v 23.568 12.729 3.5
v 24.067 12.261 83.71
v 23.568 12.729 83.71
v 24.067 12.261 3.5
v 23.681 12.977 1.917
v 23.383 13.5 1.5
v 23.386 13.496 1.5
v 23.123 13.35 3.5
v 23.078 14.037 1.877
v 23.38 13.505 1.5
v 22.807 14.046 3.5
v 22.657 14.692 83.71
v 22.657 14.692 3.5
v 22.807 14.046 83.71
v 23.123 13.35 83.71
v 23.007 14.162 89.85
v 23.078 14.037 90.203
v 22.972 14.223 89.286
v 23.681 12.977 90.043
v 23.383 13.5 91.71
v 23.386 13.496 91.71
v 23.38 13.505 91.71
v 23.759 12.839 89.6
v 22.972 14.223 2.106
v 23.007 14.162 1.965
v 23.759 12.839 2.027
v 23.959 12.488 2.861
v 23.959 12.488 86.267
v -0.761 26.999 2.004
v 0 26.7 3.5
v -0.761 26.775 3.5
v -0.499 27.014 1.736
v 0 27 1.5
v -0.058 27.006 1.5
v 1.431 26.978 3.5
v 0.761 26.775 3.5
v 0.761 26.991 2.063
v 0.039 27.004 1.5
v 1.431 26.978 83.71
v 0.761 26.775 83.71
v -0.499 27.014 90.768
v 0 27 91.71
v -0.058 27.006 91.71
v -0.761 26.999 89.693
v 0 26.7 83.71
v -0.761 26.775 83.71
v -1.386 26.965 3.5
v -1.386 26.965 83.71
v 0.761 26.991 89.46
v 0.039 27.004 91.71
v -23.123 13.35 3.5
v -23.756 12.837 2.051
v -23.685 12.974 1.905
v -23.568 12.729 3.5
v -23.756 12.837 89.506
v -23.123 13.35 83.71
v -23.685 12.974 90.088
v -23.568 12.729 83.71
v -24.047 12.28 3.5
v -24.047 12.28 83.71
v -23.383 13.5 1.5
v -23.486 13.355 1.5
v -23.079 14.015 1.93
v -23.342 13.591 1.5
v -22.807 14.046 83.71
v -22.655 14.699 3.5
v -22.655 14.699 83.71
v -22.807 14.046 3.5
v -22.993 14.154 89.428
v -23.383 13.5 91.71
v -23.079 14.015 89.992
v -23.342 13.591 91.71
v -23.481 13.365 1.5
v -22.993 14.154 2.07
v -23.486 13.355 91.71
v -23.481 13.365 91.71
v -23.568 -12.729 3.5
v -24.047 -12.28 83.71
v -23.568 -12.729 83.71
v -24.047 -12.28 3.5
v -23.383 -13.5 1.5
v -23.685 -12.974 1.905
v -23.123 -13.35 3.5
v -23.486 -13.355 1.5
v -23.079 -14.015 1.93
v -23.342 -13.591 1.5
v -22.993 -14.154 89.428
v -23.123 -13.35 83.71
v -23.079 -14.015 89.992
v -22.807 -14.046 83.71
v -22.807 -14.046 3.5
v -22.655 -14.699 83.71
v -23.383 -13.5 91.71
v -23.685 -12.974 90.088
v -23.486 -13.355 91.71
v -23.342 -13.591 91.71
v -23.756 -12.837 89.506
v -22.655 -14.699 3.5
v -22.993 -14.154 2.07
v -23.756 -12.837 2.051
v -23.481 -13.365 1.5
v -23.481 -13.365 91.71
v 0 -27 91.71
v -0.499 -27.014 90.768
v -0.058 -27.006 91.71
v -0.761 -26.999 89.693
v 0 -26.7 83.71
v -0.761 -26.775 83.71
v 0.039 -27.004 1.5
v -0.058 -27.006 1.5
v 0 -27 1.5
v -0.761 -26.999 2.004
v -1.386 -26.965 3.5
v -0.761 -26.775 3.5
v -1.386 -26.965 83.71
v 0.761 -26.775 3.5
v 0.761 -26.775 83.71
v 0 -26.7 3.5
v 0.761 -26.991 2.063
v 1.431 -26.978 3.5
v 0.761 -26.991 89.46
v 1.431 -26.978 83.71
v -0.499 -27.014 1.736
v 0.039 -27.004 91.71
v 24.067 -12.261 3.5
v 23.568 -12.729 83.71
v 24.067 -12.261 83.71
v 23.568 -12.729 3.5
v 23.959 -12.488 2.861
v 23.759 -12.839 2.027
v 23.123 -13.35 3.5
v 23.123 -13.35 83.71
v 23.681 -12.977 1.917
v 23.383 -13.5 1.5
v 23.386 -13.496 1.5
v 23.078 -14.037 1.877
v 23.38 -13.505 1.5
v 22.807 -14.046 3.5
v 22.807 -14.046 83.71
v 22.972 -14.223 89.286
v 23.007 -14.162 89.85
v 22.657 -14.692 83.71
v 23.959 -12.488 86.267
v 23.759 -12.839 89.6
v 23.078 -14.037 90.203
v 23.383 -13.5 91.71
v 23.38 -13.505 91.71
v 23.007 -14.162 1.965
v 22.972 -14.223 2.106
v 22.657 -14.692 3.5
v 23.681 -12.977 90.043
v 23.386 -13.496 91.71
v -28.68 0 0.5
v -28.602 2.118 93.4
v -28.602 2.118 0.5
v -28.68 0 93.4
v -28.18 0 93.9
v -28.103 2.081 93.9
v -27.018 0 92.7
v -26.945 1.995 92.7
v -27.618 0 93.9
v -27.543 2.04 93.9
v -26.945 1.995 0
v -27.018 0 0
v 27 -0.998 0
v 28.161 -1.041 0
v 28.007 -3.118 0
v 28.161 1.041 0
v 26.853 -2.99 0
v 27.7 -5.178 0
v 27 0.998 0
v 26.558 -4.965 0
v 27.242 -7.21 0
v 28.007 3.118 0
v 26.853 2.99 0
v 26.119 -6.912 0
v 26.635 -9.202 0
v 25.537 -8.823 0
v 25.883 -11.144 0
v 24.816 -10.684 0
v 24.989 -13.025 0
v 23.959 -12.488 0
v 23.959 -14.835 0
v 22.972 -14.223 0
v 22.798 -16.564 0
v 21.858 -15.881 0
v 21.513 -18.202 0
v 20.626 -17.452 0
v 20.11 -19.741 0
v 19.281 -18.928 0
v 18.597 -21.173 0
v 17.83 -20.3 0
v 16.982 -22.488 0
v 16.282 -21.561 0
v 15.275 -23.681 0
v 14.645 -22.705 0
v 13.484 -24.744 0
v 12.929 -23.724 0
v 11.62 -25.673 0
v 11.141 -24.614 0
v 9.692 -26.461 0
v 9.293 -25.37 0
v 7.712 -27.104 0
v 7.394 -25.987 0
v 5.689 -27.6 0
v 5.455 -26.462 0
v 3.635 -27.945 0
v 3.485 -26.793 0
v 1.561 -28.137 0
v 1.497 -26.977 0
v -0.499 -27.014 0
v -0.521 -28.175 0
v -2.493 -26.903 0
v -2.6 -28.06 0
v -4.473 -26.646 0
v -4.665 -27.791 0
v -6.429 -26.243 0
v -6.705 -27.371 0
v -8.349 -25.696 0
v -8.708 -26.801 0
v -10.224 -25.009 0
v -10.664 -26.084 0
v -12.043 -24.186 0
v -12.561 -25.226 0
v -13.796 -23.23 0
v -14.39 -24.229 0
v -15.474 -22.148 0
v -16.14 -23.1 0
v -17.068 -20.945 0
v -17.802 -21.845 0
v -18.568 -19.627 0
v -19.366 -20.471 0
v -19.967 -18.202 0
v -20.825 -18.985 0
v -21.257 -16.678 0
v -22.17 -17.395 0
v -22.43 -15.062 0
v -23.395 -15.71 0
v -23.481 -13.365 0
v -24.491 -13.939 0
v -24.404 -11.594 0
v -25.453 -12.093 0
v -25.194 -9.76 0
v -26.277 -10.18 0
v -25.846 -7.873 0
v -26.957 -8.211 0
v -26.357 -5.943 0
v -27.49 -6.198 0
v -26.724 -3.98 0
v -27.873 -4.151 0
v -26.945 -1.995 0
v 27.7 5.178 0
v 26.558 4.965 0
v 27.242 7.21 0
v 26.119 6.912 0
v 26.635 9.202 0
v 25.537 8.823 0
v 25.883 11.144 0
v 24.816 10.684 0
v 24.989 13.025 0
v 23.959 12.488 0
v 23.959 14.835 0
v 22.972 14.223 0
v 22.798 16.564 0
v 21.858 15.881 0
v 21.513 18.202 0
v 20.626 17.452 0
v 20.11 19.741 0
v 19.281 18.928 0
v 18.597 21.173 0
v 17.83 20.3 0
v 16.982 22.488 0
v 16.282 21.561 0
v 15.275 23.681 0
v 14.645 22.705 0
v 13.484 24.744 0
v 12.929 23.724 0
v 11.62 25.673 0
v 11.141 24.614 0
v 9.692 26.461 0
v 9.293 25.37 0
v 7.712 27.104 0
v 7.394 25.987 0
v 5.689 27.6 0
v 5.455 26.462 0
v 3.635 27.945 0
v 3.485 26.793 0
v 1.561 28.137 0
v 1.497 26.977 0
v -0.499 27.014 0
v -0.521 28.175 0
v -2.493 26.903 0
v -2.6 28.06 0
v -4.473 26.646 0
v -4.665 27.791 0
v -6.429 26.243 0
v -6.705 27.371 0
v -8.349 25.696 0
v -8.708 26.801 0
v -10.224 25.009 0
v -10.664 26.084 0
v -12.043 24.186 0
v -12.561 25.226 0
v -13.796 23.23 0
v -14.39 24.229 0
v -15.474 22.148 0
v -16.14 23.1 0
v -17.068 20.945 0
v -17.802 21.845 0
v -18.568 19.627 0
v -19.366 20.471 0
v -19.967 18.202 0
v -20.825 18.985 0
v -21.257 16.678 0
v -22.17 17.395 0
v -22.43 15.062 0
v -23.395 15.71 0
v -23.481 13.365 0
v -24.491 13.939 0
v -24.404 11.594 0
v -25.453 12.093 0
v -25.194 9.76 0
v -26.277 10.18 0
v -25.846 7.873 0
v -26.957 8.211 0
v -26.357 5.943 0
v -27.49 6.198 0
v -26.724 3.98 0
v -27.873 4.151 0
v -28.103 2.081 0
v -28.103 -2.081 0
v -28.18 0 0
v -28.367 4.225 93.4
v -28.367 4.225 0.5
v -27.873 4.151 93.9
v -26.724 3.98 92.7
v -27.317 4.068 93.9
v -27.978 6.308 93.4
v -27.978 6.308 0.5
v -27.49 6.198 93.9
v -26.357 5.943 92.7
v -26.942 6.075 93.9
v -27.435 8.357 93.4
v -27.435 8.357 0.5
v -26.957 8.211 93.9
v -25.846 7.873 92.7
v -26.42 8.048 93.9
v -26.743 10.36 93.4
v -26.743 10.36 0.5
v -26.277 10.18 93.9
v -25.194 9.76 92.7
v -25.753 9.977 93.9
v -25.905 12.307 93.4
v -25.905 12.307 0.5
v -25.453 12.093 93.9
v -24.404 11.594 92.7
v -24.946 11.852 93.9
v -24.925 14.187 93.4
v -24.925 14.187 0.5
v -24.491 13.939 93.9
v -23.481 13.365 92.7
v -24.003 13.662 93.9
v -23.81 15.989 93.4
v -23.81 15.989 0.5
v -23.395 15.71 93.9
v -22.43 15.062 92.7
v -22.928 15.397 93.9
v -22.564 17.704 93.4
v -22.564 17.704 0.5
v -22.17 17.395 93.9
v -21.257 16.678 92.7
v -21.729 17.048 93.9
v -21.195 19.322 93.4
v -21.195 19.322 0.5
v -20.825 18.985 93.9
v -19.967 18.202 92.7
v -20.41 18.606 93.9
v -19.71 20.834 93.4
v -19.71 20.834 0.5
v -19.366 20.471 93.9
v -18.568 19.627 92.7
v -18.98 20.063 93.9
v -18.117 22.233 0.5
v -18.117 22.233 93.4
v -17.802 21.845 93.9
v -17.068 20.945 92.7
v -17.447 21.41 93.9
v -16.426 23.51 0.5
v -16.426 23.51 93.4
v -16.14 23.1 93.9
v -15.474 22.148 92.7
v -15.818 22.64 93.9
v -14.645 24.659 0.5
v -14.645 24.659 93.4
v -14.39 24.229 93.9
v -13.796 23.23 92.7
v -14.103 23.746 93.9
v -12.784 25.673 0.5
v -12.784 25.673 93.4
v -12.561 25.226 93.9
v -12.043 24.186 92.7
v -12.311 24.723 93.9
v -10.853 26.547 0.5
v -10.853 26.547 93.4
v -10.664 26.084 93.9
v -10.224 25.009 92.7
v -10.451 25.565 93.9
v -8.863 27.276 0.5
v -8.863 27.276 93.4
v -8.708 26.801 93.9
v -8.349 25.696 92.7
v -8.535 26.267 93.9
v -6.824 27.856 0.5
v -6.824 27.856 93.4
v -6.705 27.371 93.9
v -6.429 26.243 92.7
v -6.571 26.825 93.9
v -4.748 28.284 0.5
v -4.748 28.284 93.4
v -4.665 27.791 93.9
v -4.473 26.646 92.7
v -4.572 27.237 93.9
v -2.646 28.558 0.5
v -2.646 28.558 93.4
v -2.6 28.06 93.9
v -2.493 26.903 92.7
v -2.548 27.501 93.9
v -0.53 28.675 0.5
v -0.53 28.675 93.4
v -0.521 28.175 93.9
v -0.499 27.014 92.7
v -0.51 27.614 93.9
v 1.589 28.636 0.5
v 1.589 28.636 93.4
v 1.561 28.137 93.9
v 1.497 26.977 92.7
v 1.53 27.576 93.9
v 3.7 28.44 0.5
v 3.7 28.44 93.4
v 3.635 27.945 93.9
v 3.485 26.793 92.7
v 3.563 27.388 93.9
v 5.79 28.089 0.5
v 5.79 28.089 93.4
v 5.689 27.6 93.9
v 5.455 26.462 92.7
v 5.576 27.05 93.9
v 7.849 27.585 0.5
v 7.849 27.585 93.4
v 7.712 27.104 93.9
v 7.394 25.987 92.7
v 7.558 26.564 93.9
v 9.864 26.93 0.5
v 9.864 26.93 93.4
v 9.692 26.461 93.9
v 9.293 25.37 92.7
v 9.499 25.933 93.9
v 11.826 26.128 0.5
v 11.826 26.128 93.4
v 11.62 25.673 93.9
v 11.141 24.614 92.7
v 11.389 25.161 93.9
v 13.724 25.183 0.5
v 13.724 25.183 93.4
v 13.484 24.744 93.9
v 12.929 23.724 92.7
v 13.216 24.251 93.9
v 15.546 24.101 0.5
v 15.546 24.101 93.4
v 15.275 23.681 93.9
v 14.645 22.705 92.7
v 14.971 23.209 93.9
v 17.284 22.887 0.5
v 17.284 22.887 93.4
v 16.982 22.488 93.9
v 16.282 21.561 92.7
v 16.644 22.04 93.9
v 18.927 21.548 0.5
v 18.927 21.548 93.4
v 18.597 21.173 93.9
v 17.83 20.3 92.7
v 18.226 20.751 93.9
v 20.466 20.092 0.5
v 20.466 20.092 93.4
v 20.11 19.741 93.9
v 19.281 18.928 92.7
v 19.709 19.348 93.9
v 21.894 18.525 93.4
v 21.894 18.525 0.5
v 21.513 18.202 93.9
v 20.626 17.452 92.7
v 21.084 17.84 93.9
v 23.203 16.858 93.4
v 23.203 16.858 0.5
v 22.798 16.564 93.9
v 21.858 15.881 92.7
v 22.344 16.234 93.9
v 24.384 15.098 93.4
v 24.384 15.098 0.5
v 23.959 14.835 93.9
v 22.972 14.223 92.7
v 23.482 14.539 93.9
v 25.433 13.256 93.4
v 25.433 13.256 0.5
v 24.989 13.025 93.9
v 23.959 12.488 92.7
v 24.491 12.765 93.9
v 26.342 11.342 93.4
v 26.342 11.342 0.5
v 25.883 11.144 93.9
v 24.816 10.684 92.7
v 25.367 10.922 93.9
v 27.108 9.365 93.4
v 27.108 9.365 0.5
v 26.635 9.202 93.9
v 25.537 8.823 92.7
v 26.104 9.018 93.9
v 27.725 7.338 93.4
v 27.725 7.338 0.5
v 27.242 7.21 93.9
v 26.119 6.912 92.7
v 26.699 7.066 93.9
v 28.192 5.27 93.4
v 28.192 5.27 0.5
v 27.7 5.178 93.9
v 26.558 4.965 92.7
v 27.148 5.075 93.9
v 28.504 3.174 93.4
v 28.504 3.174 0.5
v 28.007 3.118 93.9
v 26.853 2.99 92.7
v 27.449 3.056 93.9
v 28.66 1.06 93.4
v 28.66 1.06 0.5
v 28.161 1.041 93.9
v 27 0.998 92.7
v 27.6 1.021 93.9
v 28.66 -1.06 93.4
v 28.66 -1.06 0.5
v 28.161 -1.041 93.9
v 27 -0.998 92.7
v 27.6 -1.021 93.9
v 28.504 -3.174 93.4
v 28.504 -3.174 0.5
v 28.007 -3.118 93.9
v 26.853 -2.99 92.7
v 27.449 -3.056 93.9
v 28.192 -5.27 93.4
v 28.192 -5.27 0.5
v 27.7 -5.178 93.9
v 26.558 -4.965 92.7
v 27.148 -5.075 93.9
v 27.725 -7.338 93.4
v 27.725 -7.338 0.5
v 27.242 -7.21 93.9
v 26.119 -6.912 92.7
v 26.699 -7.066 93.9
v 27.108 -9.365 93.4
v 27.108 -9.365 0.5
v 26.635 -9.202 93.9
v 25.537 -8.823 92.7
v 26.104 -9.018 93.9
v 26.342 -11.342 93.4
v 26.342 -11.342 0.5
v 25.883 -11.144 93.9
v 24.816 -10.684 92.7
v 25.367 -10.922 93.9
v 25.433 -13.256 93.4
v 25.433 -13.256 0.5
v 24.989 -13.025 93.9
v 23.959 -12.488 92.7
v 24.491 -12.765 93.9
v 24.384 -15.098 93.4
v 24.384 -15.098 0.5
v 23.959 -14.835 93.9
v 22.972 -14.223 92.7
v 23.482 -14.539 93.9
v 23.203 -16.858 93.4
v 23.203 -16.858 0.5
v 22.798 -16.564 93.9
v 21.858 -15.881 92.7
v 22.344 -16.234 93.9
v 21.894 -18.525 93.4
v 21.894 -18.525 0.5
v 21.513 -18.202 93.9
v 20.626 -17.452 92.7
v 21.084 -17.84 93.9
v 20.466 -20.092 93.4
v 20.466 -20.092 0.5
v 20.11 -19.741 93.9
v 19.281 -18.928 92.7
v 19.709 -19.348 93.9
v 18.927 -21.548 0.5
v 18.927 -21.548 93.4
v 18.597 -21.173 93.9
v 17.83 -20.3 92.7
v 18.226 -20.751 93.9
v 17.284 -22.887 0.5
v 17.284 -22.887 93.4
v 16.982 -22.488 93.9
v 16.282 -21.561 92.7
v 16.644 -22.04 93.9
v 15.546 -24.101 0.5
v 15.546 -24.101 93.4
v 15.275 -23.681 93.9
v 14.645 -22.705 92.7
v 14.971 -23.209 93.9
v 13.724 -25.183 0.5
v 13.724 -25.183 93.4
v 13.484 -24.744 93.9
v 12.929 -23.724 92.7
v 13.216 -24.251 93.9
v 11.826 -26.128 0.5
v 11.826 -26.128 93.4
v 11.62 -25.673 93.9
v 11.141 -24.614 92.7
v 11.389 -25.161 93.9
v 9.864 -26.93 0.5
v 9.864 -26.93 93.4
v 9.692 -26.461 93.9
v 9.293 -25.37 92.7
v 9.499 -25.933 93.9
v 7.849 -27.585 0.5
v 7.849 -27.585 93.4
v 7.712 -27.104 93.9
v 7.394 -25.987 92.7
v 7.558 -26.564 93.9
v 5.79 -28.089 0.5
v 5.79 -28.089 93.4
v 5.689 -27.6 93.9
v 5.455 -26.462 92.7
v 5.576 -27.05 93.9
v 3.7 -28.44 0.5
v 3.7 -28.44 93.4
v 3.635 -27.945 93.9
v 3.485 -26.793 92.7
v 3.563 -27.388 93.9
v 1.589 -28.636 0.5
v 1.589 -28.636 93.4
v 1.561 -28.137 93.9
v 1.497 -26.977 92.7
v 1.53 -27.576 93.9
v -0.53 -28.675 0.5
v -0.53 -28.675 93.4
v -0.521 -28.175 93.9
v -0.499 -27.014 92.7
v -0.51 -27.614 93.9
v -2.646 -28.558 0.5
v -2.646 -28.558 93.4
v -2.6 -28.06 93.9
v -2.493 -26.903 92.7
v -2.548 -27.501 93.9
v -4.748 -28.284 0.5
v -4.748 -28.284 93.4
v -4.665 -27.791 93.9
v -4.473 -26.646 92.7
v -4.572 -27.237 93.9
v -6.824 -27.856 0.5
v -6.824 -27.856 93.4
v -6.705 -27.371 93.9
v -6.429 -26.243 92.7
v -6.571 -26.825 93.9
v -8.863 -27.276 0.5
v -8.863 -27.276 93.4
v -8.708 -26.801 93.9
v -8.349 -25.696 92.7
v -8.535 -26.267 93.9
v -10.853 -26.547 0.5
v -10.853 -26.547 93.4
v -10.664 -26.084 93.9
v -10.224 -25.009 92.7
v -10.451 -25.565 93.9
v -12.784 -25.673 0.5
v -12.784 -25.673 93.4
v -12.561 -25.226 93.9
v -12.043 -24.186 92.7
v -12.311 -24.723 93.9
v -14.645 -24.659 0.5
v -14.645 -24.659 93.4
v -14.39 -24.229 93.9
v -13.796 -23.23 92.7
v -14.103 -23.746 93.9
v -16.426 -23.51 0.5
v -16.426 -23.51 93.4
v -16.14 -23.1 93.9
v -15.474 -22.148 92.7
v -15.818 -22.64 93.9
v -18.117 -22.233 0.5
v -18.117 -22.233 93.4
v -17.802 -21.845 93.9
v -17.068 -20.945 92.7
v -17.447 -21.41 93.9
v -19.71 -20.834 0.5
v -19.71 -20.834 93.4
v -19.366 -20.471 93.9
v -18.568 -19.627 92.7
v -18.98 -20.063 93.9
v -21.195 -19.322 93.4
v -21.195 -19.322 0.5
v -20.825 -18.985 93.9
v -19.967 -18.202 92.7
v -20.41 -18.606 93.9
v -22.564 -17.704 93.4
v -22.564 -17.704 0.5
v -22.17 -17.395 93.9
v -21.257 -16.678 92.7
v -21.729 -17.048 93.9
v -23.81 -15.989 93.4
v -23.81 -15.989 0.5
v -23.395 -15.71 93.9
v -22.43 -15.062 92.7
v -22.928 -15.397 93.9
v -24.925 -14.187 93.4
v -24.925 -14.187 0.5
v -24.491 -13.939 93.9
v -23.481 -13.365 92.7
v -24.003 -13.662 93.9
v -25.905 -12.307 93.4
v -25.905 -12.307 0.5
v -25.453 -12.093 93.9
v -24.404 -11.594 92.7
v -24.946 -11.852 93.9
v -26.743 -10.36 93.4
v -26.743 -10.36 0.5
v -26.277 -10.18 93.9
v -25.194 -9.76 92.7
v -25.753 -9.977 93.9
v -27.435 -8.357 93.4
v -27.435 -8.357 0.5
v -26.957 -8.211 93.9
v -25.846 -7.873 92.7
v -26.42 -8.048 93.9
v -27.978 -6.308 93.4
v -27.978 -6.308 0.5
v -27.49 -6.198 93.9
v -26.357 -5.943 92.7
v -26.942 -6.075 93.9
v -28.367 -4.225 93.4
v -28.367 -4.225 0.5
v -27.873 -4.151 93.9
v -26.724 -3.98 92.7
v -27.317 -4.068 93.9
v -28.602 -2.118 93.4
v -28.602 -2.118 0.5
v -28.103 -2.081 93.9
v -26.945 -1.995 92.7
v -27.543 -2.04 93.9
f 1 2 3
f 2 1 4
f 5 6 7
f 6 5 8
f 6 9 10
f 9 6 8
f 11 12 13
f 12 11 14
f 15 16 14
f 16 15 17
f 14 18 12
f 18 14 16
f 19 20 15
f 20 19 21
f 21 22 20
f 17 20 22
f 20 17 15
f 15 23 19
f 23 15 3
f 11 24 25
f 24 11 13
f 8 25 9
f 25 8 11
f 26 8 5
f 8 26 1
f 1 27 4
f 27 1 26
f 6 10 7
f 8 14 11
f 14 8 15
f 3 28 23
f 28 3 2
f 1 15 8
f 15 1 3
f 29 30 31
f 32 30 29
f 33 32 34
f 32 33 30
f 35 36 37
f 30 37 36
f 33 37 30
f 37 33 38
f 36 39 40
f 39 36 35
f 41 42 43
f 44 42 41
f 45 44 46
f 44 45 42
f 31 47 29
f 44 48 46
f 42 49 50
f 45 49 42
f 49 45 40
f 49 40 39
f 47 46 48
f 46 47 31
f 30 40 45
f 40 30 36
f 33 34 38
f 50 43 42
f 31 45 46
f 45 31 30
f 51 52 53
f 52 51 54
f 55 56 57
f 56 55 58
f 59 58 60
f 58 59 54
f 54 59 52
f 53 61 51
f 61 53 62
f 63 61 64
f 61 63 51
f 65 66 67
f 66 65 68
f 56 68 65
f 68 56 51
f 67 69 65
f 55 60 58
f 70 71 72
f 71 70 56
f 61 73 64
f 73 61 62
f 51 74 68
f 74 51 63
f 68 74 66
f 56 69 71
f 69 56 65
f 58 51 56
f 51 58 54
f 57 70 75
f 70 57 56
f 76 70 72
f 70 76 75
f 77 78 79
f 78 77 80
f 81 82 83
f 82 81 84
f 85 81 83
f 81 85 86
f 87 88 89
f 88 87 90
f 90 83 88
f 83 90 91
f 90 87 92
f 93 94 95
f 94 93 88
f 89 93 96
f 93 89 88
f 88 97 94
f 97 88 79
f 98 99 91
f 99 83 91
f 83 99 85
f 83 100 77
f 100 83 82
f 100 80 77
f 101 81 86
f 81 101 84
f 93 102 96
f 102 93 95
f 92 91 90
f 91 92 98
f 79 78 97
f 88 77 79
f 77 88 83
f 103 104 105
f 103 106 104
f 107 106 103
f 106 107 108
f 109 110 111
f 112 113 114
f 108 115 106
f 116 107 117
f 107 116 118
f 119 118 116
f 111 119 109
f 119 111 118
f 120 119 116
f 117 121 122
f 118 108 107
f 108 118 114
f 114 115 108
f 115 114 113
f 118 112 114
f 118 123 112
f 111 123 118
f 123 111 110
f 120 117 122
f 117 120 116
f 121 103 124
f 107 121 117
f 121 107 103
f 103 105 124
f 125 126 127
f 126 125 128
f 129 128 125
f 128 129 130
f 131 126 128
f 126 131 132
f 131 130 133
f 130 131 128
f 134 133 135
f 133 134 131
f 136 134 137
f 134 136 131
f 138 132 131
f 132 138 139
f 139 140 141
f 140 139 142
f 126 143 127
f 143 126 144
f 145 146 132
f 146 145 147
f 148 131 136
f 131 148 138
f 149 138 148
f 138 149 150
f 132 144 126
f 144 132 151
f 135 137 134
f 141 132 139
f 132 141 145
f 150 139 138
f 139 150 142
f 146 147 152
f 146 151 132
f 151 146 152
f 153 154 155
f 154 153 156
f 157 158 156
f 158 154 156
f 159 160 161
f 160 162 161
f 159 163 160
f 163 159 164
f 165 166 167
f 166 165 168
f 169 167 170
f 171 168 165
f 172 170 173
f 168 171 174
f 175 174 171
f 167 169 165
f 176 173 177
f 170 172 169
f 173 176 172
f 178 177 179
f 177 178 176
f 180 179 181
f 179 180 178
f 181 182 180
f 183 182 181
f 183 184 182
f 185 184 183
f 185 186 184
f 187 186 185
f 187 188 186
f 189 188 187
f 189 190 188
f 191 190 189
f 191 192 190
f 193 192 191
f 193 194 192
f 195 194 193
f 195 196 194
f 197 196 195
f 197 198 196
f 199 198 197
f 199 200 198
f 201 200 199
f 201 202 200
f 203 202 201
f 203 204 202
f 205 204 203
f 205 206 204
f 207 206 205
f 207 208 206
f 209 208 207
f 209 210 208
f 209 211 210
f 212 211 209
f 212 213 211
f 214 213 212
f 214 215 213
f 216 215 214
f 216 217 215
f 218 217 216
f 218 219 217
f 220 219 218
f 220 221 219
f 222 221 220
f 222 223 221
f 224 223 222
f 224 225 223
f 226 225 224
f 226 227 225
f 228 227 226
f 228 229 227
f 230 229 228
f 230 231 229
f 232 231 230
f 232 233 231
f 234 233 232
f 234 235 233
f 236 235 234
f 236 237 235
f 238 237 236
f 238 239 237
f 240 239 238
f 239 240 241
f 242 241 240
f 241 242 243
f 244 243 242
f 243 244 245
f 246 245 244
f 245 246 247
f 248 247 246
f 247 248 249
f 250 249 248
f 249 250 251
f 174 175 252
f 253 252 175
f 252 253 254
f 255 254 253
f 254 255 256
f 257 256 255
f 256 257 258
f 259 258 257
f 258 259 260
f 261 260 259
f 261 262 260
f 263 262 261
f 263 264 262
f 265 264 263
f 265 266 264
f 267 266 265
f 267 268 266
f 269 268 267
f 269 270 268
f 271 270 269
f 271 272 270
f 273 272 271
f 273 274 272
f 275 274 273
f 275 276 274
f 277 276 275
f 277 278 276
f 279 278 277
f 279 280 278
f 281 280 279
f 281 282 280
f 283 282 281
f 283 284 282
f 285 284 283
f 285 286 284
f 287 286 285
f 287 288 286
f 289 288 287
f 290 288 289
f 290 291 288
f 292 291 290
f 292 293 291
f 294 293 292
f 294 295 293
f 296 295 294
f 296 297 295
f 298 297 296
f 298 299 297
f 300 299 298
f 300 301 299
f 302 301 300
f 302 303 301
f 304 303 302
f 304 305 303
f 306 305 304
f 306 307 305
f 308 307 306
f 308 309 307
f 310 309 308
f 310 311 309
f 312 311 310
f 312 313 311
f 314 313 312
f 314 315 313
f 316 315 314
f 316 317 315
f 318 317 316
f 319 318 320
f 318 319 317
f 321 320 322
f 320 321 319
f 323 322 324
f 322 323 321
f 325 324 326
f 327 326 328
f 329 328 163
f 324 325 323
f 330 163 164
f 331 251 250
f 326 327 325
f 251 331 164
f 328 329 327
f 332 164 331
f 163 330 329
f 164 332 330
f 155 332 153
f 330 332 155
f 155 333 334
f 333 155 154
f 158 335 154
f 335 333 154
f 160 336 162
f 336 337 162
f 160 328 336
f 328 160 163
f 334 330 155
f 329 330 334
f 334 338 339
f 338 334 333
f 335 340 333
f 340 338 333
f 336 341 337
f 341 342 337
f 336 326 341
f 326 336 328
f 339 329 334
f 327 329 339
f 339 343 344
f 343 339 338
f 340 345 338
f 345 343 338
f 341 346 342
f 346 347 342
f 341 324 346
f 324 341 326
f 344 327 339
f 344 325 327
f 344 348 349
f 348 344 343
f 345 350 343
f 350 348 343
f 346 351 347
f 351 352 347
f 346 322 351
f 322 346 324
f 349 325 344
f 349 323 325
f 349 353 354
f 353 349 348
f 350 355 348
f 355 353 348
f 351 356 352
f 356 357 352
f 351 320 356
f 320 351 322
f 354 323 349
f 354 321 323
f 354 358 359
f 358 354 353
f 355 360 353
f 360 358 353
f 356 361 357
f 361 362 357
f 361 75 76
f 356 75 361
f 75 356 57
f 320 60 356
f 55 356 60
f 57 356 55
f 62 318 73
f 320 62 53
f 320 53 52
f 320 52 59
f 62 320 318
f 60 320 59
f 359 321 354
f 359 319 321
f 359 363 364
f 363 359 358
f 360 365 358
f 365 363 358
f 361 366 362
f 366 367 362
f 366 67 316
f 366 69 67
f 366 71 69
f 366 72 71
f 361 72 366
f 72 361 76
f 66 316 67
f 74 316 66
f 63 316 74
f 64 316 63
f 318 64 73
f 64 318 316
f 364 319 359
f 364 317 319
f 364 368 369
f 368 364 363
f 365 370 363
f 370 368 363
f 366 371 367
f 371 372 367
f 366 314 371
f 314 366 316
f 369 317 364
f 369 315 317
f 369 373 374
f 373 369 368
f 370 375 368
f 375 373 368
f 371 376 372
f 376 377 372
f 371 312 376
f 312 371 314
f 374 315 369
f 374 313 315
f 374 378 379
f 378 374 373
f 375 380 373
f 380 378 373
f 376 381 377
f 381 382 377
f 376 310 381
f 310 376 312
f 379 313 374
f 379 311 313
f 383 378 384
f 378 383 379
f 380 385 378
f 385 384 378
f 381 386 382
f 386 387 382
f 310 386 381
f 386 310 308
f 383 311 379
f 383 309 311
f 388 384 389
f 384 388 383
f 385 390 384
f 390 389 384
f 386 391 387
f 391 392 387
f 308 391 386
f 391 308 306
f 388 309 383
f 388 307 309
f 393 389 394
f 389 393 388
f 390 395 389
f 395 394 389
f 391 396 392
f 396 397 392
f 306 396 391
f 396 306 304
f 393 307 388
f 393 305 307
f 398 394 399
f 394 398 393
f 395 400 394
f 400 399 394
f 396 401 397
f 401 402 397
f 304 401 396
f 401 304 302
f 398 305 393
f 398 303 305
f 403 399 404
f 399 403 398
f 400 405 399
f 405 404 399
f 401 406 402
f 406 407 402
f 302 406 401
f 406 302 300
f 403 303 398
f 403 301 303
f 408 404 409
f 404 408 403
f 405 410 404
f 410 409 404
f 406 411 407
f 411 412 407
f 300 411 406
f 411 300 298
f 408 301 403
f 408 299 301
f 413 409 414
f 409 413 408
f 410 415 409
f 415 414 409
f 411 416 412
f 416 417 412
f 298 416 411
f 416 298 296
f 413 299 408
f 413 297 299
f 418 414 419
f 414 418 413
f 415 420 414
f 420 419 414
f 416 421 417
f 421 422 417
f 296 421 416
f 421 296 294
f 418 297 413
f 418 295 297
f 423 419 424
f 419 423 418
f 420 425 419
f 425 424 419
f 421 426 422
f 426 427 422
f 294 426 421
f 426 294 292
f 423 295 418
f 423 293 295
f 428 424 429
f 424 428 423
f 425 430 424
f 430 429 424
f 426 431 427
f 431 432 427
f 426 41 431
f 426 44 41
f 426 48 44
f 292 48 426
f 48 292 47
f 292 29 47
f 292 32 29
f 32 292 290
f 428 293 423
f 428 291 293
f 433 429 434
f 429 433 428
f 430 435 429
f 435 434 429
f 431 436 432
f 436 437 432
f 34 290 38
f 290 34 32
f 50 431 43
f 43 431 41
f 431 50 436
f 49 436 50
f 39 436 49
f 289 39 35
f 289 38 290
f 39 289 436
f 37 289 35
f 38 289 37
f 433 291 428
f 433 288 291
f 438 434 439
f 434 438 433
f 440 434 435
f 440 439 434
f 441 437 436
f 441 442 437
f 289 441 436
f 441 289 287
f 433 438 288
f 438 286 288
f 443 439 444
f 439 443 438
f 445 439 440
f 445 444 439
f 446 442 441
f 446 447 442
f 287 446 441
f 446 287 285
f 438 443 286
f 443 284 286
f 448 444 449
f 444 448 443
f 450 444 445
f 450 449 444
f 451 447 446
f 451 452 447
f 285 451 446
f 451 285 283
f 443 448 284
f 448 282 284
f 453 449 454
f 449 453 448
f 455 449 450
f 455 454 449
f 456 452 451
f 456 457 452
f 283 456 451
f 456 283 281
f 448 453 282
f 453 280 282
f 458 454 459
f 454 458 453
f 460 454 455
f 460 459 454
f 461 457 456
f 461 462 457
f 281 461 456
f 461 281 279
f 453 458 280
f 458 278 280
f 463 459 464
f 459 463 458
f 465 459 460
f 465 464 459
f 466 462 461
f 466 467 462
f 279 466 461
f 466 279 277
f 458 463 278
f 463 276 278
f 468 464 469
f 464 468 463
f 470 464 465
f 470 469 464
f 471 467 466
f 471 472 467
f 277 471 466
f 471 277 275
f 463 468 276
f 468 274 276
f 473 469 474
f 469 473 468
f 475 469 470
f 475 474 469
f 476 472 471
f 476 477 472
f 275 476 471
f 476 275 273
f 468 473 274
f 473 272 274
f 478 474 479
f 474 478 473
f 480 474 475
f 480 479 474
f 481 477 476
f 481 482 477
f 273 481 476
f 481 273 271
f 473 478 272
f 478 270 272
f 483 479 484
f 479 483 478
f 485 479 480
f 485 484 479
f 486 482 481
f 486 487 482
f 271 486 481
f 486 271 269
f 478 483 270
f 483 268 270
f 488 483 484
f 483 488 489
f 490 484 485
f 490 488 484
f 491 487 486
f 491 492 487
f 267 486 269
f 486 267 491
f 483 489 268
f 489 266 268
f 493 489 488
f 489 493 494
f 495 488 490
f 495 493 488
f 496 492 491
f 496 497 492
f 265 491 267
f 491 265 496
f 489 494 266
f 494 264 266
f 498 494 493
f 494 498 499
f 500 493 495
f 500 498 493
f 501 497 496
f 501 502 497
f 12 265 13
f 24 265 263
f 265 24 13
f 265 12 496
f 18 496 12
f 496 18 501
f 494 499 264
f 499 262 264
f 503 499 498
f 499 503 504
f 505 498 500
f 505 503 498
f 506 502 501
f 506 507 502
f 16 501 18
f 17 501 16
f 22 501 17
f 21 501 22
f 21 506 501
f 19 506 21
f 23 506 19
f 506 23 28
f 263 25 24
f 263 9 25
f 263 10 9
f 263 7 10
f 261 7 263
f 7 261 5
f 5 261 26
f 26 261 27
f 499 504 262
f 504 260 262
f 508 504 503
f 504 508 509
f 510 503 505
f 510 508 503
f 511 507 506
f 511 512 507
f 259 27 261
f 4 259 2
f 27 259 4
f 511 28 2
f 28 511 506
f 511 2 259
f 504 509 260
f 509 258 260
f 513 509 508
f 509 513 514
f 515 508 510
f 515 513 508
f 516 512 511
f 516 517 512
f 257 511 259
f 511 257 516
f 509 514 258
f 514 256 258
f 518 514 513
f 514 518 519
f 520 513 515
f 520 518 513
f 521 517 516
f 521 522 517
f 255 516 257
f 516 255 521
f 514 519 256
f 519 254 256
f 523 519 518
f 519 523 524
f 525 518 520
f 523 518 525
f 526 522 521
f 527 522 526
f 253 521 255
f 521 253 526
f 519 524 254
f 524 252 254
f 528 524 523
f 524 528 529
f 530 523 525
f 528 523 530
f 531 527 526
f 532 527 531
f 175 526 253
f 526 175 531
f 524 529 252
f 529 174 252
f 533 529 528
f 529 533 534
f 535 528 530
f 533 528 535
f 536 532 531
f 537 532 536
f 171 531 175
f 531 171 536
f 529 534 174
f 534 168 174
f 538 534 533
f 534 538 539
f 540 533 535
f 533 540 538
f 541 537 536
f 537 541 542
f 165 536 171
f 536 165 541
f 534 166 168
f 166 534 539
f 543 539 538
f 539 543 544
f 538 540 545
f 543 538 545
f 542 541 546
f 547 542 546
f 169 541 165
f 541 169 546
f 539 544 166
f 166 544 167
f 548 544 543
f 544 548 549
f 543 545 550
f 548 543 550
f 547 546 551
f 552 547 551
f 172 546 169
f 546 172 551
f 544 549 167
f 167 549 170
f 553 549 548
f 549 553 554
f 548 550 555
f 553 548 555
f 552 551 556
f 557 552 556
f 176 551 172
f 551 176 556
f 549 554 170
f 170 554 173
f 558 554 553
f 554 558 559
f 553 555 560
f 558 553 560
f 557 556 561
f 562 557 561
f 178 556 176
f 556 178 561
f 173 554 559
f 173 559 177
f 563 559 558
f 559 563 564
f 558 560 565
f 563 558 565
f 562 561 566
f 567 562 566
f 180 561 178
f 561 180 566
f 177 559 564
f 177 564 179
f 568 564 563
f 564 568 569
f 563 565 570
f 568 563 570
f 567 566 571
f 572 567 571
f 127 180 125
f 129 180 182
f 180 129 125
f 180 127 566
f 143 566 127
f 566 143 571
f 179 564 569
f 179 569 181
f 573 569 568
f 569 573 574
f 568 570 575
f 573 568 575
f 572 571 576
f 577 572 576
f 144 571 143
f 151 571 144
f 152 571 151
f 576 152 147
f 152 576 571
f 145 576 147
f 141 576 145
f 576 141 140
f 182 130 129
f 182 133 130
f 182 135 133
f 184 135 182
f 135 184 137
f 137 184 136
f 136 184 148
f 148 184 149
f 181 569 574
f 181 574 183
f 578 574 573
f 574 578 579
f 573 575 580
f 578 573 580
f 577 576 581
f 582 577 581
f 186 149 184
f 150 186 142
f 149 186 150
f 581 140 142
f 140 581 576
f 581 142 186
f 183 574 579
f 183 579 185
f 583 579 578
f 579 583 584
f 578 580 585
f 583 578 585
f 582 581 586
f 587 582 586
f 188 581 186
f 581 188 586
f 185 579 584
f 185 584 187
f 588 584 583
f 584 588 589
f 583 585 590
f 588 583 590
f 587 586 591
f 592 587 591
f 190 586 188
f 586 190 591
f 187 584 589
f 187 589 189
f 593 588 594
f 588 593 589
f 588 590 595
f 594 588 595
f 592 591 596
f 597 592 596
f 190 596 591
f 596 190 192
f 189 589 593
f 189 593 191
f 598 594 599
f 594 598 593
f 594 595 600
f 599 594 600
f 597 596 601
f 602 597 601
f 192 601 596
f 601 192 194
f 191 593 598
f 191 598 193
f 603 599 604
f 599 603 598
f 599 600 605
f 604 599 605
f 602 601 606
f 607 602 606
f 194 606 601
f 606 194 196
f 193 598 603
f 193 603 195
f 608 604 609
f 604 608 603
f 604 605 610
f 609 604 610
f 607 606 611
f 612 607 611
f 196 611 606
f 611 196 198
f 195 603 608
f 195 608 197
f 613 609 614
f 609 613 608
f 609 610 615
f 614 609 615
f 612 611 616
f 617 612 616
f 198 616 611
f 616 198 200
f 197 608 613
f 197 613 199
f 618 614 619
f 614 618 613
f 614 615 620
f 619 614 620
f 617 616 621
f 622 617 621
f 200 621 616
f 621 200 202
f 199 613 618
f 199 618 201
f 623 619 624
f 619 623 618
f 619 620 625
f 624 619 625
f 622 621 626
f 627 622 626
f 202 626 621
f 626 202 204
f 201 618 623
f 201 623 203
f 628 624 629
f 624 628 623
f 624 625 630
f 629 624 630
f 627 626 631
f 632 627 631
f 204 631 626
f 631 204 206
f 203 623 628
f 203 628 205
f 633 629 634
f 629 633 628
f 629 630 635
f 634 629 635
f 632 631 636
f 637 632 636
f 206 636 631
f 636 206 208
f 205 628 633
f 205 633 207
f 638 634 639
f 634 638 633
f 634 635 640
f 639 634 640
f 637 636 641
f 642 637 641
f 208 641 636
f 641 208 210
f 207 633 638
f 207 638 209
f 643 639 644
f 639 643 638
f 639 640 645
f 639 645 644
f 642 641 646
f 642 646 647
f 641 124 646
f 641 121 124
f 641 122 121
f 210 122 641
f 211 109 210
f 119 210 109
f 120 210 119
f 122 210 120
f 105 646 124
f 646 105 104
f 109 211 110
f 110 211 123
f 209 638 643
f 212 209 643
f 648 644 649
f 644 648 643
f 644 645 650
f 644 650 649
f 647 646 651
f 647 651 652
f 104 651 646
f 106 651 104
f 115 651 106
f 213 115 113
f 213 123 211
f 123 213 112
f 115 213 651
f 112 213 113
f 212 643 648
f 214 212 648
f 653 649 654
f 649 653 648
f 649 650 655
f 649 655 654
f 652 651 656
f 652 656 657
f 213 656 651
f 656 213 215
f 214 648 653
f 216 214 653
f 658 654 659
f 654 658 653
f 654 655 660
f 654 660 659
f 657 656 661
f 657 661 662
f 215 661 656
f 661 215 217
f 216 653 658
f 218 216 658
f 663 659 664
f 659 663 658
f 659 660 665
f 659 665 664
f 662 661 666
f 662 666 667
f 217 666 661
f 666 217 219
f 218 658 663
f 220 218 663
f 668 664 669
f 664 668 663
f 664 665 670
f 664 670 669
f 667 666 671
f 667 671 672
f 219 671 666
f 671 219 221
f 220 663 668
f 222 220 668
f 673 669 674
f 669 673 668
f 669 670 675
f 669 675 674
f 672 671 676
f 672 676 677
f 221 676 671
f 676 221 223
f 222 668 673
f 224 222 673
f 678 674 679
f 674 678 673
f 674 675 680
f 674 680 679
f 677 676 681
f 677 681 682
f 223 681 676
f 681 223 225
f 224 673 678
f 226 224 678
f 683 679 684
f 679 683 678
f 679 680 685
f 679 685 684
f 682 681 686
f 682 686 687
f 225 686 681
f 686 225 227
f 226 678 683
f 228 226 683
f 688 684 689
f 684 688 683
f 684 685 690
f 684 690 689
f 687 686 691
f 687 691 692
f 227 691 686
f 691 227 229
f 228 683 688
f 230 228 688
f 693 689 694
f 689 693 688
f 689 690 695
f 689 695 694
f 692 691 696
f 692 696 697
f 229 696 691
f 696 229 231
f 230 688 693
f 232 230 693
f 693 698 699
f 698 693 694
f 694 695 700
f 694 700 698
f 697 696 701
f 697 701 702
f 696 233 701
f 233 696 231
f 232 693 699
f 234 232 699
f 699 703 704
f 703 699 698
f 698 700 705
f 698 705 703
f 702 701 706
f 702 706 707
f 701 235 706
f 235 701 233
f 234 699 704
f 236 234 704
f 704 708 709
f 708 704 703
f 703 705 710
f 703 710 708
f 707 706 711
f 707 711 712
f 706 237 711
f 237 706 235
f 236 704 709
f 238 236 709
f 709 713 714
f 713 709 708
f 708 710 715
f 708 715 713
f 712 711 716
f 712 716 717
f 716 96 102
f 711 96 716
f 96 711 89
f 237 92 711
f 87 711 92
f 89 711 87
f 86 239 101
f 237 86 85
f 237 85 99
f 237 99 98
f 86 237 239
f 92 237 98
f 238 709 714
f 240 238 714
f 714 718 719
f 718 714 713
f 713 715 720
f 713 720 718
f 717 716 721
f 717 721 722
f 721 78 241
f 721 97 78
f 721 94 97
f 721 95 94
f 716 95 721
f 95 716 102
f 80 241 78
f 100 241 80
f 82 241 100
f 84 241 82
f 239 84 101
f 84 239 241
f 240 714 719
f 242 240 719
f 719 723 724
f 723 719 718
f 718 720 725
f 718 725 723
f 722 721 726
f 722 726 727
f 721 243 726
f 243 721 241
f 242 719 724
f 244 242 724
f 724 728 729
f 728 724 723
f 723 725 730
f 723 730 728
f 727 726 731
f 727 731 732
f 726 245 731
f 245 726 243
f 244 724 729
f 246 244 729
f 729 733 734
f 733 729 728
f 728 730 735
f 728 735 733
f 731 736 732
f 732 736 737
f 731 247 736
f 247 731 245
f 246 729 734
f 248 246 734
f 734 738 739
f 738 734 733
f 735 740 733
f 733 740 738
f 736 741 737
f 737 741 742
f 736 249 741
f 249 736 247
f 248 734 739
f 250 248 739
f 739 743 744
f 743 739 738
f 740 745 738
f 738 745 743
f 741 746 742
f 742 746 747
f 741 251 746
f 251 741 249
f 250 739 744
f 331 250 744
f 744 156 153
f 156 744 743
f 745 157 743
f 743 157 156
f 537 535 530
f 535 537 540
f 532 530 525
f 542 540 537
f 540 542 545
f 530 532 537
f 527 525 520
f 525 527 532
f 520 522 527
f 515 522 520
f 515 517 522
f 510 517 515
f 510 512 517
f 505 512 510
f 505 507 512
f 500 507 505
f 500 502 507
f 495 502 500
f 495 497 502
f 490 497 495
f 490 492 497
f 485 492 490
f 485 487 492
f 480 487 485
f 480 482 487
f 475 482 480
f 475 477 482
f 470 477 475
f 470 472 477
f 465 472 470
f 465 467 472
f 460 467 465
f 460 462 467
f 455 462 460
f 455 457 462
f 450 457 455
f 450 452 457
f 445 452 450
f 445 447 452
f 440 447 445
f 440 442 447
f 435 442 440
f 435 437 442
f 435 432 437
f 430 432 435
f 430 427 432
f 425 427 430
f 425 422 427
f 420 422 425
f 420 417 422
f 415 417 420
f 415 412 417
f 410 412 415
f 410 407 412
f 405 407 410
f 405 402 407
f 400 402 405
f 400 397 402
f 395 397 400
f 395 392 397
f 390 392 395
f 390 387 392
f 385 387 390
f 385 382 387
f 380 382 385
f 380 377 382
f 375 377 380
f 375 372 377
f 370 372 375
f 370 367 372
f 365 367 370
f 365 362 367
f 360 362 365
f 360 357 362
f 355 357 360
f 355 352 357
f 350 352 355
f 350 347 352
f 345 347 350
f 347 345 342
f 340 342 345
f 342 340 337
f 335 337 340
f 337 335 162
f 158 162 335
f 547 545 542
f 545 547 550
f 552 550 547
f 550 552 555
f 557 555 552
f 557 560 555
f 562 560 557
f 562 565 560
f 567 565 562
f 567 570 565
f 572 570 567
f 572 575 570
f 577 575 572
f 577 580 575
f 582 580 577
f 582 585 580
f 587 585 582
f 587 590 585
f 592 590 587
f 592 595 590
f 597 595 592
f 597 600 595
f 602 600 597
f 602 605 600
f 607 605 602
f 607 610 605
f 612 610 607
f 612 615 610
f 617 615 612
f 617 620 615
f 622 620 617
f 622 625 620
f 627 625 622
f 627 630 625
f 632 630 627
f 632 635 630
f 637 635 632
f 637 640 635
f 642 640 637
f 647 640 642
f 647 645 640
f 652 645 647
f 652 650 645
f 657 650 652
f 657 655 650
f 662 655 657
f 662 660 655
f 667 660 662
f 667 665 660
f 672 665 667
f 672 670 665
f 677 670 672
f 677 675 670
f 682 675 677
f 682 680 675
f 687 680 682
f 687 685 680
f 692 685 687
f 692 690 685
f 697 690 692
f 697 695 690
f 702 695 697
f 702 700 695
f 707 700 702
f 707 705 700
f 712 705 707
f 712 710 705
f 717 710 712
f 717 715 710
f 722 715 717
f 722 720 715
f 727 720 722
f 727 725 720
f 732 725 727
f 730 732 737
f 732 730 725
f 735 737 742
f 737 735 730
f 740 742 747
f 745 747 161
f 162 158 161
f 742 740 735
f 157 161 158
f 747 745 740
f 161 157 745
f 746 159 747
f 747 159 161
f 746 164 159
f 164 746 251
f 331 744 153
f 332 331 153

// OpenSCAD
// Sleeve — drops into the fish koozie and holds a 250 ml / 8.3 oz slim can
// instead of the 12 oz one.
//
// The fish-koozie cousin of slim-can-adapter-ring-12oz-to-8-3oz.scad, and
// the same sleeve: Ø54.00 bore with six grip ribs for the 250 ml can, a 1.68
// wall, Ø57.36 outside, which goes into the fish's Ø58.40 bore past its six
// ribs exactly as a 12 oz can does. The fish's bore is the holders' bore to
// the last digit — same recipe, same ribs, same 0.23 of pull-in assumed — so
// every number in [Can], [Host] and [Grip ribs] is lifted from that ring and
// none of them is a decision made here.
//
// WHAT IS DIFFERENT IS THE TOP, AND THERE ISN'T ONE. The holders have a flat
// Ø76.20 rim for a lip to sit on and be lifted by. The fish has a mouth. Its
// Ø58.40 bore is cut straight up through both jaws to the tips of the lips,
// so above the bore's top (z 86.0 on the fish, lead-in to 86.6) there is no
// rim, no ledge and no room: the mouth is the bore, continued, with the jaws
// standing 105 to 117 mm up on two sides and the corners of the mouth down
// at 89 and 92–98 on the other two. Measured on the built mesh of
// slim-can-holder-3in-12oz-fish v02, in 30-degree sectors from +x: 97.5, 110.1, 116.9,
// 116.8, 109.9, 98.3, 89.3, 104.6, 111.9, 111.9, 105.5, 91.9. A lip cannot
// go anywhere in that.
//
// So there is no lip, and the sleeve works the other way round from the
// ring: it stands on the fish's floor instead of hanging off a rim, and it
// is tall enough to come up through the mouth and stand proud of the low
// corner by 10 mm. That exposed arc of rim, 15–25 mm of it, is what a thumb
// inside and a finger outside pinch to pull the sleeve out — after the can,
// which stands 40 mm above it anyway. The bottom is open, like the ring's,
// so the can sits on the fish's own floor and the fish's drain still pushes
// it out from underneath. Nothing sets the depth but the floor, which is
// flat and on the axis; a lip seated on the fish's skewed lead-in would have
// sat crooked.
//
// THE WALL IS ONE RUNG, for the ring's reason: between a Ø54.00 bore and an
// outside that has to pass the fish's ribs there is 1.68 of wall and no more.
// The slicing reference's four-loop figure is 1.74; 1.68 is what the ring is
// drawn at and the two should be printed and judged together.
//
// ORIENTATION. Drawn as used and PRINTED THE SAME WAY, open bottom on the
// bed: there is no lip to turn it over for, and printed this way up the
// first layer is the base with its 0.50 chamfer and a square inside edge,
// 1.18 wide, where the rim end would put a 0.4 mm ring on the plate. Going
// up, the rib feet grow inward at 8 degrees, the rib ramps and the base
// chamfer narrow, and the mouth lead-in at the top opens the bore outward,
// all of which the printer sees as nothing. The rim's outside chamfer
// narrows going up too. A 94 mm tube on a 1.2 mm ring is tall for its foot;
// if it lets go of the plate, a brim is the slicer's answer, not a wider
// foot that would not pass the ribs.
//
// ⚠️ THE ONE THING NOT PROVEN is how an outside diameter prints on this
// machine — the same gap the ring has, and neither has been printed yet.
// The coupon is the bottom 20 mm of the sleeve, printed exactly as the
// sleeve prints, so the base chamfer is on the bed and the cut face is at
// the top where there is no elephant foot to fake a tight reading. It tests
// the sleeve in the fish and a can in the sleeve at once.
//
// The coupon is the only thing here a plate can answer, and there is one
// variant for it, so the plate and the component are the same. Keep the
// names stable — utils/coupon.sh reads these and knows nothing about the part.
//
// COUPON-COMPONENTS: fit=coupon
// COUPON-PLATE: coupon

/* [Output] */

// "cut" is a half-section for reading the wall, the chamfers and the ribs.
// Not for printing. "coupon" is the fit test; see [Fit coupon].
show = "part";   // [part, cut, coupon]

$fa = 4;   // organic faceting per the 0.4-nozzle rule; no global high $fn
$fs = 0.4;
eps = 0.01;

/* [Can] */

// Body diameter of a 250 ml / 8.3 oz slim can (mm). Red Bull's sleek can, and
// the number slim-can-holder-8-3oz.scad is cut to.
can_d = 53.0;
// Clearance on diameter at the bore itself (mm). The ribs, not this, set the
// grip — this only has to let the can pass.
can_slop = 0.40;
// Extra diameter added to the bore to cover this machine's bore shrinkage (mm).
// Settled 2026-08-22 on the 250 ml holder's fit coupon and carried here
// unchanged, as the ring carries it. ⚠️ Do NOT "correct" this to the measured
// 0.23: it and rib_h are a matched pair.
bore_comp = 0.60;

/* [Host — the fish this drops into] */

// Read off parts/slim-can-holder-3in-12oz-fish.scad and its built mesh. Change them only
// if the fish changes; nothing here is a choice.

// The fish's bore as drawn (mm): can 57.40 + slop 0.40 + comp 0.60.
host_bore_d = 58.40;
// What this machine takes out of a bore that size (mm on diameter), measured
// on the Ø54 bore and carried by the holders' own argument that the loss is
// absolute, not proportional.
host_bore_loss = 0.23;
// How far the fish's grip ribs stand into its bore (mm).
host_rib_h = 0.30;
// Top of the fish's floor (mm above its bed): floor_t. The sleeve stands on it.
host_floor_z = 5.40;
// Top of the fish's bore (mm), where the lead-in starts opening: bore_top.
host_bore_top_z = 86.03;
// The lowest point of the mouth's rim at the bore (mm above the fish's bed):
// the corner of the mouth at 180–210 degrees, measured on the built mesh.
// The sleeve's rim stands proud of this.
host_mouth_low_z = 89.3;
// Drain through the fish's floor (mm), on the axis. The sleeve's bottom ring
// has to clear it.
host_drain_d = 12.0;

/* [Sleeve] */

// Wall between the can and the fish (mm). 1.68 is 4 walls at 0.42; see THE
// WALL IS ONE RUNG in the header.
wall_w = 1.68;
// How far the rim stands above the lowest corner of the fish's mouth (mm).
// It is the handle: enough to get a thumb and a finger on.
proud = 10.0;
// 45-degree chamfer on the outside of the bottom edge (mm). On the bed, so
// it is the elephant-foot chamfer — the reference's PETG minimum — and the
// lead-in past the fish's ribs on the way down.
base_cham = 0.50;
// 45-degree chamfer on the outside of the rim (mm). Narrows going up.
rim_cham = 0.50;
// Lead-in at the mouth, for the can (mm): how far out on radius, and over
// what height. Small, because the wall has 1.68 to share between this and
// the rim chamfer and the rim still has to have a top.
mouth_cham_r = 0.60;
mouth_cham_h = 1.20;

/* [Grip ribs] */

// Rounded vertical ribs in the bore. The 250 ml holder's six, unchanged.
rib_count = 6;
rib_h     = 0.30;   // how far each rib stands into the bore (mm)
rib_w     = 3.00;   // chord width of the bump (mm)
rib_ramp  = 8.0;    // lead-in at the top, over which the rib fades to nothing (mm)
rib_foot  = 2.0;    // the same at the bottom, where the printer sees it as an overhang (mm)

/* [Fit coupon] */

// Height of the coupon (mm): the bottom of the sleeve, base chamfer and rib
// feet included, printed the same way up as the sleeve. 20 is the 2 mm foot
// and 16.5 mm of full-proud rib.
coupon_h = 20.00;

/* [Quality] */

// Chord error target (mm). 0.02 is the 0.4-nozzle figure.
chord_err = 0.02;

/* [Hidden] */

// Facets for a target chord error on a given radius.
function facets(r, e = chord_err) = ceil(180 / acos(1 - e / r));
// Radius that makes the INSCRIBED polygon's inner radius equal r.
function r_hole(r, n) = r / cos(180 / n);

bore_d    = can_d + can_slop + bore_comp;
bore_r    = bore_d / 2;
sleeve_od = bore_d + 2 * wall_w;
sleeve_r  = sleeve_od / 2;

rim_z     = host_mouth_low_z + proud;      // the rim, on the fish's scale
total_h   = rim_z - host_floor_z;          // floor to rim

nseg      = facets(sleeve_r);
r_bore    = r_hole(bore_r, nseg);

// What the sleeve faces in the fish, printed, and what it leaves.
host_across_ribs = host_bore_d - host_bore_loss - 2 * host_rib_h;
host_clear       = host_across_ribs - sleeve_od;

rib_r    = rib_h > 0 ? (rib_w * rib_w / 4 + rib_h * rib_h) / (2 * rib_h) : 0;
rib_ax   = bore_r + rib_r - rib_h;
rib_z0   = base_cham + 1.0;
rib_z1   = total_h - mouth_cham_h - 1.0;

assert(sleeve_od < host_bore_d - 2 * host_rib_h,
       str("the sleeve is fatter than the fish's ribs will pass: ",
           sleeve_od, " against ", host_bore_d - 2 * host_rib_h));
assert(wall_w >= 1.26,
       "the wall is under 3 lines at 0.42: raise wall_w");
assert(bore_r + mouth_cham_r < sleeve_r - rim_cham,
       "the mouth lead-in has run into the rim's chamfer: the rim has no top");
assert(bore_d > host_drain_d + 2,
       "the sleeve's bottom ring sits over the fish's drain");
assert(rim_z > host_bore_top_z + 5,
       "the rim is inside the fish's bore: raise proud");
assert(rib_z1 - rib_ramp > rib_z0 + rib_foot,
       "the rib ramp and foot overlap: the sleeve is too short for them");
assert(coupon_h > rib_z0 + rib_foot + 5,
       "the coupon is too short to reach full-proud rib");

// Solid section, before the bore is cut. Bottom inner corner first, running
// counter-clockwise: bottom, base chamfer, outside, rim chamfer, top, mouth
// lead-in, bore.
module sleeve_solid() {
    pts = [
        [r_bore,                 0],
        [sleeve_r - base_cham,   0],
        [sleeve_r,               base_cham],
        [sleeve_r,               total_h - rim_cham],
        [sleeve_r - rim_cham,    total_h],
        [r_bore + mouth_cham_r,  total_h],
        [r_bore,                 total_h - mouth_cham_h]
    ];
    rotate_extrude(angle = 360, $fn = nseg) polygon(pts);
}

module ribs() {
    n = facets(rib_r);
    for (i = [0 : rib_count - 1])
        // Half a pitch off the x axis, so the cut view at y = 0 shows the bore
        // and not a rib edge-on.
        rotate([0, 0, 30 + i * 360 / rib_count])
            hull() {
                translate([bore_r + rib_r, 0, rib_z0])
                    cylinder(r = rib_r, h = eps, $fn = n);
                translate([rib_ax, 0, rib_z0 + rib_foot])
                    cylinder(r = rib_r, h = eps, $fn = n);
                translate([rib_ax, 0, rib_z1 - rib_ramp])
                    cylinder(r = rib_r, h = eps, $fn = n);
                translate([bore_r + rib_r, 0, rib_z1])
                    cylinder(r = rib_r, h = eps, $fn = n);
            }
}

// Each rib is a 3.90 mm arc of which 0.30 is wanted, so left alone it would
// poke out through a 1.68 mm wall. It is clipped to a cylinder inside the
// sleeve's outer face before it goes in — inside, not at it, so no face of
// the clip is coincident with the sleeve.
module sleeve() {
    union() {
        sleeve_solid();
        if (rib_count > 0 && rib_h > 0)
            intersection() {
                ribs();
                cylinder(r = sleeve_r - 0.20, h = total_h, $fn = nseg);
            }
    }
}

// The fit coupon: the bottom coupon_h of the sleeve, as it is.
module fit_coupon() {
    intersection() {
        sleeve();
        translate([-sleeve_od, -sleeve_od, -eps])
            cube([2 * sleeve_od, 2 * sleeve_od, coupon_h + eps]);
    }
}

echo(str("sleeve: outside ", sleeve_od, "  bore ", bore_d,
         "  across ribs ", bore_d - 2 * rib_h, "  wall ", wall_w,
         "  ", total_h, " tall, floor at ", host_floor_z,
         " to rim at ", rim_z, " on the fish"));
echo(str("in the fish: faces ", host_across_ribs,
         " across its printed ribs, clearance ", host_clear,
         " on diameter; rim stands ", proud,
         " above the low corner of the mouth and ",
         rim_z - host_bore_top_z, " above the bore's top"));
echo(str("on the can: printed bore ", bore_d - host_bore_loss,
         ", across ribs ", bore_d - host_bore_loss - 2 * rib_h,
         ", clearance ", bore_d - host_bore_loss - 2 * rib_h - can_d,
         " on a ", can_d, " can"));

if (show == "coupon")
    fit_coupon();
else if (show == "cut")
    difference() {
        sleeve();
        translate([-sleeve_od, -sleeve_od, -eps])
            cube([2 * sleeve_od, sleeve_od, total_h + 1]);
    }
else if (show == "part")
    sleeve();
